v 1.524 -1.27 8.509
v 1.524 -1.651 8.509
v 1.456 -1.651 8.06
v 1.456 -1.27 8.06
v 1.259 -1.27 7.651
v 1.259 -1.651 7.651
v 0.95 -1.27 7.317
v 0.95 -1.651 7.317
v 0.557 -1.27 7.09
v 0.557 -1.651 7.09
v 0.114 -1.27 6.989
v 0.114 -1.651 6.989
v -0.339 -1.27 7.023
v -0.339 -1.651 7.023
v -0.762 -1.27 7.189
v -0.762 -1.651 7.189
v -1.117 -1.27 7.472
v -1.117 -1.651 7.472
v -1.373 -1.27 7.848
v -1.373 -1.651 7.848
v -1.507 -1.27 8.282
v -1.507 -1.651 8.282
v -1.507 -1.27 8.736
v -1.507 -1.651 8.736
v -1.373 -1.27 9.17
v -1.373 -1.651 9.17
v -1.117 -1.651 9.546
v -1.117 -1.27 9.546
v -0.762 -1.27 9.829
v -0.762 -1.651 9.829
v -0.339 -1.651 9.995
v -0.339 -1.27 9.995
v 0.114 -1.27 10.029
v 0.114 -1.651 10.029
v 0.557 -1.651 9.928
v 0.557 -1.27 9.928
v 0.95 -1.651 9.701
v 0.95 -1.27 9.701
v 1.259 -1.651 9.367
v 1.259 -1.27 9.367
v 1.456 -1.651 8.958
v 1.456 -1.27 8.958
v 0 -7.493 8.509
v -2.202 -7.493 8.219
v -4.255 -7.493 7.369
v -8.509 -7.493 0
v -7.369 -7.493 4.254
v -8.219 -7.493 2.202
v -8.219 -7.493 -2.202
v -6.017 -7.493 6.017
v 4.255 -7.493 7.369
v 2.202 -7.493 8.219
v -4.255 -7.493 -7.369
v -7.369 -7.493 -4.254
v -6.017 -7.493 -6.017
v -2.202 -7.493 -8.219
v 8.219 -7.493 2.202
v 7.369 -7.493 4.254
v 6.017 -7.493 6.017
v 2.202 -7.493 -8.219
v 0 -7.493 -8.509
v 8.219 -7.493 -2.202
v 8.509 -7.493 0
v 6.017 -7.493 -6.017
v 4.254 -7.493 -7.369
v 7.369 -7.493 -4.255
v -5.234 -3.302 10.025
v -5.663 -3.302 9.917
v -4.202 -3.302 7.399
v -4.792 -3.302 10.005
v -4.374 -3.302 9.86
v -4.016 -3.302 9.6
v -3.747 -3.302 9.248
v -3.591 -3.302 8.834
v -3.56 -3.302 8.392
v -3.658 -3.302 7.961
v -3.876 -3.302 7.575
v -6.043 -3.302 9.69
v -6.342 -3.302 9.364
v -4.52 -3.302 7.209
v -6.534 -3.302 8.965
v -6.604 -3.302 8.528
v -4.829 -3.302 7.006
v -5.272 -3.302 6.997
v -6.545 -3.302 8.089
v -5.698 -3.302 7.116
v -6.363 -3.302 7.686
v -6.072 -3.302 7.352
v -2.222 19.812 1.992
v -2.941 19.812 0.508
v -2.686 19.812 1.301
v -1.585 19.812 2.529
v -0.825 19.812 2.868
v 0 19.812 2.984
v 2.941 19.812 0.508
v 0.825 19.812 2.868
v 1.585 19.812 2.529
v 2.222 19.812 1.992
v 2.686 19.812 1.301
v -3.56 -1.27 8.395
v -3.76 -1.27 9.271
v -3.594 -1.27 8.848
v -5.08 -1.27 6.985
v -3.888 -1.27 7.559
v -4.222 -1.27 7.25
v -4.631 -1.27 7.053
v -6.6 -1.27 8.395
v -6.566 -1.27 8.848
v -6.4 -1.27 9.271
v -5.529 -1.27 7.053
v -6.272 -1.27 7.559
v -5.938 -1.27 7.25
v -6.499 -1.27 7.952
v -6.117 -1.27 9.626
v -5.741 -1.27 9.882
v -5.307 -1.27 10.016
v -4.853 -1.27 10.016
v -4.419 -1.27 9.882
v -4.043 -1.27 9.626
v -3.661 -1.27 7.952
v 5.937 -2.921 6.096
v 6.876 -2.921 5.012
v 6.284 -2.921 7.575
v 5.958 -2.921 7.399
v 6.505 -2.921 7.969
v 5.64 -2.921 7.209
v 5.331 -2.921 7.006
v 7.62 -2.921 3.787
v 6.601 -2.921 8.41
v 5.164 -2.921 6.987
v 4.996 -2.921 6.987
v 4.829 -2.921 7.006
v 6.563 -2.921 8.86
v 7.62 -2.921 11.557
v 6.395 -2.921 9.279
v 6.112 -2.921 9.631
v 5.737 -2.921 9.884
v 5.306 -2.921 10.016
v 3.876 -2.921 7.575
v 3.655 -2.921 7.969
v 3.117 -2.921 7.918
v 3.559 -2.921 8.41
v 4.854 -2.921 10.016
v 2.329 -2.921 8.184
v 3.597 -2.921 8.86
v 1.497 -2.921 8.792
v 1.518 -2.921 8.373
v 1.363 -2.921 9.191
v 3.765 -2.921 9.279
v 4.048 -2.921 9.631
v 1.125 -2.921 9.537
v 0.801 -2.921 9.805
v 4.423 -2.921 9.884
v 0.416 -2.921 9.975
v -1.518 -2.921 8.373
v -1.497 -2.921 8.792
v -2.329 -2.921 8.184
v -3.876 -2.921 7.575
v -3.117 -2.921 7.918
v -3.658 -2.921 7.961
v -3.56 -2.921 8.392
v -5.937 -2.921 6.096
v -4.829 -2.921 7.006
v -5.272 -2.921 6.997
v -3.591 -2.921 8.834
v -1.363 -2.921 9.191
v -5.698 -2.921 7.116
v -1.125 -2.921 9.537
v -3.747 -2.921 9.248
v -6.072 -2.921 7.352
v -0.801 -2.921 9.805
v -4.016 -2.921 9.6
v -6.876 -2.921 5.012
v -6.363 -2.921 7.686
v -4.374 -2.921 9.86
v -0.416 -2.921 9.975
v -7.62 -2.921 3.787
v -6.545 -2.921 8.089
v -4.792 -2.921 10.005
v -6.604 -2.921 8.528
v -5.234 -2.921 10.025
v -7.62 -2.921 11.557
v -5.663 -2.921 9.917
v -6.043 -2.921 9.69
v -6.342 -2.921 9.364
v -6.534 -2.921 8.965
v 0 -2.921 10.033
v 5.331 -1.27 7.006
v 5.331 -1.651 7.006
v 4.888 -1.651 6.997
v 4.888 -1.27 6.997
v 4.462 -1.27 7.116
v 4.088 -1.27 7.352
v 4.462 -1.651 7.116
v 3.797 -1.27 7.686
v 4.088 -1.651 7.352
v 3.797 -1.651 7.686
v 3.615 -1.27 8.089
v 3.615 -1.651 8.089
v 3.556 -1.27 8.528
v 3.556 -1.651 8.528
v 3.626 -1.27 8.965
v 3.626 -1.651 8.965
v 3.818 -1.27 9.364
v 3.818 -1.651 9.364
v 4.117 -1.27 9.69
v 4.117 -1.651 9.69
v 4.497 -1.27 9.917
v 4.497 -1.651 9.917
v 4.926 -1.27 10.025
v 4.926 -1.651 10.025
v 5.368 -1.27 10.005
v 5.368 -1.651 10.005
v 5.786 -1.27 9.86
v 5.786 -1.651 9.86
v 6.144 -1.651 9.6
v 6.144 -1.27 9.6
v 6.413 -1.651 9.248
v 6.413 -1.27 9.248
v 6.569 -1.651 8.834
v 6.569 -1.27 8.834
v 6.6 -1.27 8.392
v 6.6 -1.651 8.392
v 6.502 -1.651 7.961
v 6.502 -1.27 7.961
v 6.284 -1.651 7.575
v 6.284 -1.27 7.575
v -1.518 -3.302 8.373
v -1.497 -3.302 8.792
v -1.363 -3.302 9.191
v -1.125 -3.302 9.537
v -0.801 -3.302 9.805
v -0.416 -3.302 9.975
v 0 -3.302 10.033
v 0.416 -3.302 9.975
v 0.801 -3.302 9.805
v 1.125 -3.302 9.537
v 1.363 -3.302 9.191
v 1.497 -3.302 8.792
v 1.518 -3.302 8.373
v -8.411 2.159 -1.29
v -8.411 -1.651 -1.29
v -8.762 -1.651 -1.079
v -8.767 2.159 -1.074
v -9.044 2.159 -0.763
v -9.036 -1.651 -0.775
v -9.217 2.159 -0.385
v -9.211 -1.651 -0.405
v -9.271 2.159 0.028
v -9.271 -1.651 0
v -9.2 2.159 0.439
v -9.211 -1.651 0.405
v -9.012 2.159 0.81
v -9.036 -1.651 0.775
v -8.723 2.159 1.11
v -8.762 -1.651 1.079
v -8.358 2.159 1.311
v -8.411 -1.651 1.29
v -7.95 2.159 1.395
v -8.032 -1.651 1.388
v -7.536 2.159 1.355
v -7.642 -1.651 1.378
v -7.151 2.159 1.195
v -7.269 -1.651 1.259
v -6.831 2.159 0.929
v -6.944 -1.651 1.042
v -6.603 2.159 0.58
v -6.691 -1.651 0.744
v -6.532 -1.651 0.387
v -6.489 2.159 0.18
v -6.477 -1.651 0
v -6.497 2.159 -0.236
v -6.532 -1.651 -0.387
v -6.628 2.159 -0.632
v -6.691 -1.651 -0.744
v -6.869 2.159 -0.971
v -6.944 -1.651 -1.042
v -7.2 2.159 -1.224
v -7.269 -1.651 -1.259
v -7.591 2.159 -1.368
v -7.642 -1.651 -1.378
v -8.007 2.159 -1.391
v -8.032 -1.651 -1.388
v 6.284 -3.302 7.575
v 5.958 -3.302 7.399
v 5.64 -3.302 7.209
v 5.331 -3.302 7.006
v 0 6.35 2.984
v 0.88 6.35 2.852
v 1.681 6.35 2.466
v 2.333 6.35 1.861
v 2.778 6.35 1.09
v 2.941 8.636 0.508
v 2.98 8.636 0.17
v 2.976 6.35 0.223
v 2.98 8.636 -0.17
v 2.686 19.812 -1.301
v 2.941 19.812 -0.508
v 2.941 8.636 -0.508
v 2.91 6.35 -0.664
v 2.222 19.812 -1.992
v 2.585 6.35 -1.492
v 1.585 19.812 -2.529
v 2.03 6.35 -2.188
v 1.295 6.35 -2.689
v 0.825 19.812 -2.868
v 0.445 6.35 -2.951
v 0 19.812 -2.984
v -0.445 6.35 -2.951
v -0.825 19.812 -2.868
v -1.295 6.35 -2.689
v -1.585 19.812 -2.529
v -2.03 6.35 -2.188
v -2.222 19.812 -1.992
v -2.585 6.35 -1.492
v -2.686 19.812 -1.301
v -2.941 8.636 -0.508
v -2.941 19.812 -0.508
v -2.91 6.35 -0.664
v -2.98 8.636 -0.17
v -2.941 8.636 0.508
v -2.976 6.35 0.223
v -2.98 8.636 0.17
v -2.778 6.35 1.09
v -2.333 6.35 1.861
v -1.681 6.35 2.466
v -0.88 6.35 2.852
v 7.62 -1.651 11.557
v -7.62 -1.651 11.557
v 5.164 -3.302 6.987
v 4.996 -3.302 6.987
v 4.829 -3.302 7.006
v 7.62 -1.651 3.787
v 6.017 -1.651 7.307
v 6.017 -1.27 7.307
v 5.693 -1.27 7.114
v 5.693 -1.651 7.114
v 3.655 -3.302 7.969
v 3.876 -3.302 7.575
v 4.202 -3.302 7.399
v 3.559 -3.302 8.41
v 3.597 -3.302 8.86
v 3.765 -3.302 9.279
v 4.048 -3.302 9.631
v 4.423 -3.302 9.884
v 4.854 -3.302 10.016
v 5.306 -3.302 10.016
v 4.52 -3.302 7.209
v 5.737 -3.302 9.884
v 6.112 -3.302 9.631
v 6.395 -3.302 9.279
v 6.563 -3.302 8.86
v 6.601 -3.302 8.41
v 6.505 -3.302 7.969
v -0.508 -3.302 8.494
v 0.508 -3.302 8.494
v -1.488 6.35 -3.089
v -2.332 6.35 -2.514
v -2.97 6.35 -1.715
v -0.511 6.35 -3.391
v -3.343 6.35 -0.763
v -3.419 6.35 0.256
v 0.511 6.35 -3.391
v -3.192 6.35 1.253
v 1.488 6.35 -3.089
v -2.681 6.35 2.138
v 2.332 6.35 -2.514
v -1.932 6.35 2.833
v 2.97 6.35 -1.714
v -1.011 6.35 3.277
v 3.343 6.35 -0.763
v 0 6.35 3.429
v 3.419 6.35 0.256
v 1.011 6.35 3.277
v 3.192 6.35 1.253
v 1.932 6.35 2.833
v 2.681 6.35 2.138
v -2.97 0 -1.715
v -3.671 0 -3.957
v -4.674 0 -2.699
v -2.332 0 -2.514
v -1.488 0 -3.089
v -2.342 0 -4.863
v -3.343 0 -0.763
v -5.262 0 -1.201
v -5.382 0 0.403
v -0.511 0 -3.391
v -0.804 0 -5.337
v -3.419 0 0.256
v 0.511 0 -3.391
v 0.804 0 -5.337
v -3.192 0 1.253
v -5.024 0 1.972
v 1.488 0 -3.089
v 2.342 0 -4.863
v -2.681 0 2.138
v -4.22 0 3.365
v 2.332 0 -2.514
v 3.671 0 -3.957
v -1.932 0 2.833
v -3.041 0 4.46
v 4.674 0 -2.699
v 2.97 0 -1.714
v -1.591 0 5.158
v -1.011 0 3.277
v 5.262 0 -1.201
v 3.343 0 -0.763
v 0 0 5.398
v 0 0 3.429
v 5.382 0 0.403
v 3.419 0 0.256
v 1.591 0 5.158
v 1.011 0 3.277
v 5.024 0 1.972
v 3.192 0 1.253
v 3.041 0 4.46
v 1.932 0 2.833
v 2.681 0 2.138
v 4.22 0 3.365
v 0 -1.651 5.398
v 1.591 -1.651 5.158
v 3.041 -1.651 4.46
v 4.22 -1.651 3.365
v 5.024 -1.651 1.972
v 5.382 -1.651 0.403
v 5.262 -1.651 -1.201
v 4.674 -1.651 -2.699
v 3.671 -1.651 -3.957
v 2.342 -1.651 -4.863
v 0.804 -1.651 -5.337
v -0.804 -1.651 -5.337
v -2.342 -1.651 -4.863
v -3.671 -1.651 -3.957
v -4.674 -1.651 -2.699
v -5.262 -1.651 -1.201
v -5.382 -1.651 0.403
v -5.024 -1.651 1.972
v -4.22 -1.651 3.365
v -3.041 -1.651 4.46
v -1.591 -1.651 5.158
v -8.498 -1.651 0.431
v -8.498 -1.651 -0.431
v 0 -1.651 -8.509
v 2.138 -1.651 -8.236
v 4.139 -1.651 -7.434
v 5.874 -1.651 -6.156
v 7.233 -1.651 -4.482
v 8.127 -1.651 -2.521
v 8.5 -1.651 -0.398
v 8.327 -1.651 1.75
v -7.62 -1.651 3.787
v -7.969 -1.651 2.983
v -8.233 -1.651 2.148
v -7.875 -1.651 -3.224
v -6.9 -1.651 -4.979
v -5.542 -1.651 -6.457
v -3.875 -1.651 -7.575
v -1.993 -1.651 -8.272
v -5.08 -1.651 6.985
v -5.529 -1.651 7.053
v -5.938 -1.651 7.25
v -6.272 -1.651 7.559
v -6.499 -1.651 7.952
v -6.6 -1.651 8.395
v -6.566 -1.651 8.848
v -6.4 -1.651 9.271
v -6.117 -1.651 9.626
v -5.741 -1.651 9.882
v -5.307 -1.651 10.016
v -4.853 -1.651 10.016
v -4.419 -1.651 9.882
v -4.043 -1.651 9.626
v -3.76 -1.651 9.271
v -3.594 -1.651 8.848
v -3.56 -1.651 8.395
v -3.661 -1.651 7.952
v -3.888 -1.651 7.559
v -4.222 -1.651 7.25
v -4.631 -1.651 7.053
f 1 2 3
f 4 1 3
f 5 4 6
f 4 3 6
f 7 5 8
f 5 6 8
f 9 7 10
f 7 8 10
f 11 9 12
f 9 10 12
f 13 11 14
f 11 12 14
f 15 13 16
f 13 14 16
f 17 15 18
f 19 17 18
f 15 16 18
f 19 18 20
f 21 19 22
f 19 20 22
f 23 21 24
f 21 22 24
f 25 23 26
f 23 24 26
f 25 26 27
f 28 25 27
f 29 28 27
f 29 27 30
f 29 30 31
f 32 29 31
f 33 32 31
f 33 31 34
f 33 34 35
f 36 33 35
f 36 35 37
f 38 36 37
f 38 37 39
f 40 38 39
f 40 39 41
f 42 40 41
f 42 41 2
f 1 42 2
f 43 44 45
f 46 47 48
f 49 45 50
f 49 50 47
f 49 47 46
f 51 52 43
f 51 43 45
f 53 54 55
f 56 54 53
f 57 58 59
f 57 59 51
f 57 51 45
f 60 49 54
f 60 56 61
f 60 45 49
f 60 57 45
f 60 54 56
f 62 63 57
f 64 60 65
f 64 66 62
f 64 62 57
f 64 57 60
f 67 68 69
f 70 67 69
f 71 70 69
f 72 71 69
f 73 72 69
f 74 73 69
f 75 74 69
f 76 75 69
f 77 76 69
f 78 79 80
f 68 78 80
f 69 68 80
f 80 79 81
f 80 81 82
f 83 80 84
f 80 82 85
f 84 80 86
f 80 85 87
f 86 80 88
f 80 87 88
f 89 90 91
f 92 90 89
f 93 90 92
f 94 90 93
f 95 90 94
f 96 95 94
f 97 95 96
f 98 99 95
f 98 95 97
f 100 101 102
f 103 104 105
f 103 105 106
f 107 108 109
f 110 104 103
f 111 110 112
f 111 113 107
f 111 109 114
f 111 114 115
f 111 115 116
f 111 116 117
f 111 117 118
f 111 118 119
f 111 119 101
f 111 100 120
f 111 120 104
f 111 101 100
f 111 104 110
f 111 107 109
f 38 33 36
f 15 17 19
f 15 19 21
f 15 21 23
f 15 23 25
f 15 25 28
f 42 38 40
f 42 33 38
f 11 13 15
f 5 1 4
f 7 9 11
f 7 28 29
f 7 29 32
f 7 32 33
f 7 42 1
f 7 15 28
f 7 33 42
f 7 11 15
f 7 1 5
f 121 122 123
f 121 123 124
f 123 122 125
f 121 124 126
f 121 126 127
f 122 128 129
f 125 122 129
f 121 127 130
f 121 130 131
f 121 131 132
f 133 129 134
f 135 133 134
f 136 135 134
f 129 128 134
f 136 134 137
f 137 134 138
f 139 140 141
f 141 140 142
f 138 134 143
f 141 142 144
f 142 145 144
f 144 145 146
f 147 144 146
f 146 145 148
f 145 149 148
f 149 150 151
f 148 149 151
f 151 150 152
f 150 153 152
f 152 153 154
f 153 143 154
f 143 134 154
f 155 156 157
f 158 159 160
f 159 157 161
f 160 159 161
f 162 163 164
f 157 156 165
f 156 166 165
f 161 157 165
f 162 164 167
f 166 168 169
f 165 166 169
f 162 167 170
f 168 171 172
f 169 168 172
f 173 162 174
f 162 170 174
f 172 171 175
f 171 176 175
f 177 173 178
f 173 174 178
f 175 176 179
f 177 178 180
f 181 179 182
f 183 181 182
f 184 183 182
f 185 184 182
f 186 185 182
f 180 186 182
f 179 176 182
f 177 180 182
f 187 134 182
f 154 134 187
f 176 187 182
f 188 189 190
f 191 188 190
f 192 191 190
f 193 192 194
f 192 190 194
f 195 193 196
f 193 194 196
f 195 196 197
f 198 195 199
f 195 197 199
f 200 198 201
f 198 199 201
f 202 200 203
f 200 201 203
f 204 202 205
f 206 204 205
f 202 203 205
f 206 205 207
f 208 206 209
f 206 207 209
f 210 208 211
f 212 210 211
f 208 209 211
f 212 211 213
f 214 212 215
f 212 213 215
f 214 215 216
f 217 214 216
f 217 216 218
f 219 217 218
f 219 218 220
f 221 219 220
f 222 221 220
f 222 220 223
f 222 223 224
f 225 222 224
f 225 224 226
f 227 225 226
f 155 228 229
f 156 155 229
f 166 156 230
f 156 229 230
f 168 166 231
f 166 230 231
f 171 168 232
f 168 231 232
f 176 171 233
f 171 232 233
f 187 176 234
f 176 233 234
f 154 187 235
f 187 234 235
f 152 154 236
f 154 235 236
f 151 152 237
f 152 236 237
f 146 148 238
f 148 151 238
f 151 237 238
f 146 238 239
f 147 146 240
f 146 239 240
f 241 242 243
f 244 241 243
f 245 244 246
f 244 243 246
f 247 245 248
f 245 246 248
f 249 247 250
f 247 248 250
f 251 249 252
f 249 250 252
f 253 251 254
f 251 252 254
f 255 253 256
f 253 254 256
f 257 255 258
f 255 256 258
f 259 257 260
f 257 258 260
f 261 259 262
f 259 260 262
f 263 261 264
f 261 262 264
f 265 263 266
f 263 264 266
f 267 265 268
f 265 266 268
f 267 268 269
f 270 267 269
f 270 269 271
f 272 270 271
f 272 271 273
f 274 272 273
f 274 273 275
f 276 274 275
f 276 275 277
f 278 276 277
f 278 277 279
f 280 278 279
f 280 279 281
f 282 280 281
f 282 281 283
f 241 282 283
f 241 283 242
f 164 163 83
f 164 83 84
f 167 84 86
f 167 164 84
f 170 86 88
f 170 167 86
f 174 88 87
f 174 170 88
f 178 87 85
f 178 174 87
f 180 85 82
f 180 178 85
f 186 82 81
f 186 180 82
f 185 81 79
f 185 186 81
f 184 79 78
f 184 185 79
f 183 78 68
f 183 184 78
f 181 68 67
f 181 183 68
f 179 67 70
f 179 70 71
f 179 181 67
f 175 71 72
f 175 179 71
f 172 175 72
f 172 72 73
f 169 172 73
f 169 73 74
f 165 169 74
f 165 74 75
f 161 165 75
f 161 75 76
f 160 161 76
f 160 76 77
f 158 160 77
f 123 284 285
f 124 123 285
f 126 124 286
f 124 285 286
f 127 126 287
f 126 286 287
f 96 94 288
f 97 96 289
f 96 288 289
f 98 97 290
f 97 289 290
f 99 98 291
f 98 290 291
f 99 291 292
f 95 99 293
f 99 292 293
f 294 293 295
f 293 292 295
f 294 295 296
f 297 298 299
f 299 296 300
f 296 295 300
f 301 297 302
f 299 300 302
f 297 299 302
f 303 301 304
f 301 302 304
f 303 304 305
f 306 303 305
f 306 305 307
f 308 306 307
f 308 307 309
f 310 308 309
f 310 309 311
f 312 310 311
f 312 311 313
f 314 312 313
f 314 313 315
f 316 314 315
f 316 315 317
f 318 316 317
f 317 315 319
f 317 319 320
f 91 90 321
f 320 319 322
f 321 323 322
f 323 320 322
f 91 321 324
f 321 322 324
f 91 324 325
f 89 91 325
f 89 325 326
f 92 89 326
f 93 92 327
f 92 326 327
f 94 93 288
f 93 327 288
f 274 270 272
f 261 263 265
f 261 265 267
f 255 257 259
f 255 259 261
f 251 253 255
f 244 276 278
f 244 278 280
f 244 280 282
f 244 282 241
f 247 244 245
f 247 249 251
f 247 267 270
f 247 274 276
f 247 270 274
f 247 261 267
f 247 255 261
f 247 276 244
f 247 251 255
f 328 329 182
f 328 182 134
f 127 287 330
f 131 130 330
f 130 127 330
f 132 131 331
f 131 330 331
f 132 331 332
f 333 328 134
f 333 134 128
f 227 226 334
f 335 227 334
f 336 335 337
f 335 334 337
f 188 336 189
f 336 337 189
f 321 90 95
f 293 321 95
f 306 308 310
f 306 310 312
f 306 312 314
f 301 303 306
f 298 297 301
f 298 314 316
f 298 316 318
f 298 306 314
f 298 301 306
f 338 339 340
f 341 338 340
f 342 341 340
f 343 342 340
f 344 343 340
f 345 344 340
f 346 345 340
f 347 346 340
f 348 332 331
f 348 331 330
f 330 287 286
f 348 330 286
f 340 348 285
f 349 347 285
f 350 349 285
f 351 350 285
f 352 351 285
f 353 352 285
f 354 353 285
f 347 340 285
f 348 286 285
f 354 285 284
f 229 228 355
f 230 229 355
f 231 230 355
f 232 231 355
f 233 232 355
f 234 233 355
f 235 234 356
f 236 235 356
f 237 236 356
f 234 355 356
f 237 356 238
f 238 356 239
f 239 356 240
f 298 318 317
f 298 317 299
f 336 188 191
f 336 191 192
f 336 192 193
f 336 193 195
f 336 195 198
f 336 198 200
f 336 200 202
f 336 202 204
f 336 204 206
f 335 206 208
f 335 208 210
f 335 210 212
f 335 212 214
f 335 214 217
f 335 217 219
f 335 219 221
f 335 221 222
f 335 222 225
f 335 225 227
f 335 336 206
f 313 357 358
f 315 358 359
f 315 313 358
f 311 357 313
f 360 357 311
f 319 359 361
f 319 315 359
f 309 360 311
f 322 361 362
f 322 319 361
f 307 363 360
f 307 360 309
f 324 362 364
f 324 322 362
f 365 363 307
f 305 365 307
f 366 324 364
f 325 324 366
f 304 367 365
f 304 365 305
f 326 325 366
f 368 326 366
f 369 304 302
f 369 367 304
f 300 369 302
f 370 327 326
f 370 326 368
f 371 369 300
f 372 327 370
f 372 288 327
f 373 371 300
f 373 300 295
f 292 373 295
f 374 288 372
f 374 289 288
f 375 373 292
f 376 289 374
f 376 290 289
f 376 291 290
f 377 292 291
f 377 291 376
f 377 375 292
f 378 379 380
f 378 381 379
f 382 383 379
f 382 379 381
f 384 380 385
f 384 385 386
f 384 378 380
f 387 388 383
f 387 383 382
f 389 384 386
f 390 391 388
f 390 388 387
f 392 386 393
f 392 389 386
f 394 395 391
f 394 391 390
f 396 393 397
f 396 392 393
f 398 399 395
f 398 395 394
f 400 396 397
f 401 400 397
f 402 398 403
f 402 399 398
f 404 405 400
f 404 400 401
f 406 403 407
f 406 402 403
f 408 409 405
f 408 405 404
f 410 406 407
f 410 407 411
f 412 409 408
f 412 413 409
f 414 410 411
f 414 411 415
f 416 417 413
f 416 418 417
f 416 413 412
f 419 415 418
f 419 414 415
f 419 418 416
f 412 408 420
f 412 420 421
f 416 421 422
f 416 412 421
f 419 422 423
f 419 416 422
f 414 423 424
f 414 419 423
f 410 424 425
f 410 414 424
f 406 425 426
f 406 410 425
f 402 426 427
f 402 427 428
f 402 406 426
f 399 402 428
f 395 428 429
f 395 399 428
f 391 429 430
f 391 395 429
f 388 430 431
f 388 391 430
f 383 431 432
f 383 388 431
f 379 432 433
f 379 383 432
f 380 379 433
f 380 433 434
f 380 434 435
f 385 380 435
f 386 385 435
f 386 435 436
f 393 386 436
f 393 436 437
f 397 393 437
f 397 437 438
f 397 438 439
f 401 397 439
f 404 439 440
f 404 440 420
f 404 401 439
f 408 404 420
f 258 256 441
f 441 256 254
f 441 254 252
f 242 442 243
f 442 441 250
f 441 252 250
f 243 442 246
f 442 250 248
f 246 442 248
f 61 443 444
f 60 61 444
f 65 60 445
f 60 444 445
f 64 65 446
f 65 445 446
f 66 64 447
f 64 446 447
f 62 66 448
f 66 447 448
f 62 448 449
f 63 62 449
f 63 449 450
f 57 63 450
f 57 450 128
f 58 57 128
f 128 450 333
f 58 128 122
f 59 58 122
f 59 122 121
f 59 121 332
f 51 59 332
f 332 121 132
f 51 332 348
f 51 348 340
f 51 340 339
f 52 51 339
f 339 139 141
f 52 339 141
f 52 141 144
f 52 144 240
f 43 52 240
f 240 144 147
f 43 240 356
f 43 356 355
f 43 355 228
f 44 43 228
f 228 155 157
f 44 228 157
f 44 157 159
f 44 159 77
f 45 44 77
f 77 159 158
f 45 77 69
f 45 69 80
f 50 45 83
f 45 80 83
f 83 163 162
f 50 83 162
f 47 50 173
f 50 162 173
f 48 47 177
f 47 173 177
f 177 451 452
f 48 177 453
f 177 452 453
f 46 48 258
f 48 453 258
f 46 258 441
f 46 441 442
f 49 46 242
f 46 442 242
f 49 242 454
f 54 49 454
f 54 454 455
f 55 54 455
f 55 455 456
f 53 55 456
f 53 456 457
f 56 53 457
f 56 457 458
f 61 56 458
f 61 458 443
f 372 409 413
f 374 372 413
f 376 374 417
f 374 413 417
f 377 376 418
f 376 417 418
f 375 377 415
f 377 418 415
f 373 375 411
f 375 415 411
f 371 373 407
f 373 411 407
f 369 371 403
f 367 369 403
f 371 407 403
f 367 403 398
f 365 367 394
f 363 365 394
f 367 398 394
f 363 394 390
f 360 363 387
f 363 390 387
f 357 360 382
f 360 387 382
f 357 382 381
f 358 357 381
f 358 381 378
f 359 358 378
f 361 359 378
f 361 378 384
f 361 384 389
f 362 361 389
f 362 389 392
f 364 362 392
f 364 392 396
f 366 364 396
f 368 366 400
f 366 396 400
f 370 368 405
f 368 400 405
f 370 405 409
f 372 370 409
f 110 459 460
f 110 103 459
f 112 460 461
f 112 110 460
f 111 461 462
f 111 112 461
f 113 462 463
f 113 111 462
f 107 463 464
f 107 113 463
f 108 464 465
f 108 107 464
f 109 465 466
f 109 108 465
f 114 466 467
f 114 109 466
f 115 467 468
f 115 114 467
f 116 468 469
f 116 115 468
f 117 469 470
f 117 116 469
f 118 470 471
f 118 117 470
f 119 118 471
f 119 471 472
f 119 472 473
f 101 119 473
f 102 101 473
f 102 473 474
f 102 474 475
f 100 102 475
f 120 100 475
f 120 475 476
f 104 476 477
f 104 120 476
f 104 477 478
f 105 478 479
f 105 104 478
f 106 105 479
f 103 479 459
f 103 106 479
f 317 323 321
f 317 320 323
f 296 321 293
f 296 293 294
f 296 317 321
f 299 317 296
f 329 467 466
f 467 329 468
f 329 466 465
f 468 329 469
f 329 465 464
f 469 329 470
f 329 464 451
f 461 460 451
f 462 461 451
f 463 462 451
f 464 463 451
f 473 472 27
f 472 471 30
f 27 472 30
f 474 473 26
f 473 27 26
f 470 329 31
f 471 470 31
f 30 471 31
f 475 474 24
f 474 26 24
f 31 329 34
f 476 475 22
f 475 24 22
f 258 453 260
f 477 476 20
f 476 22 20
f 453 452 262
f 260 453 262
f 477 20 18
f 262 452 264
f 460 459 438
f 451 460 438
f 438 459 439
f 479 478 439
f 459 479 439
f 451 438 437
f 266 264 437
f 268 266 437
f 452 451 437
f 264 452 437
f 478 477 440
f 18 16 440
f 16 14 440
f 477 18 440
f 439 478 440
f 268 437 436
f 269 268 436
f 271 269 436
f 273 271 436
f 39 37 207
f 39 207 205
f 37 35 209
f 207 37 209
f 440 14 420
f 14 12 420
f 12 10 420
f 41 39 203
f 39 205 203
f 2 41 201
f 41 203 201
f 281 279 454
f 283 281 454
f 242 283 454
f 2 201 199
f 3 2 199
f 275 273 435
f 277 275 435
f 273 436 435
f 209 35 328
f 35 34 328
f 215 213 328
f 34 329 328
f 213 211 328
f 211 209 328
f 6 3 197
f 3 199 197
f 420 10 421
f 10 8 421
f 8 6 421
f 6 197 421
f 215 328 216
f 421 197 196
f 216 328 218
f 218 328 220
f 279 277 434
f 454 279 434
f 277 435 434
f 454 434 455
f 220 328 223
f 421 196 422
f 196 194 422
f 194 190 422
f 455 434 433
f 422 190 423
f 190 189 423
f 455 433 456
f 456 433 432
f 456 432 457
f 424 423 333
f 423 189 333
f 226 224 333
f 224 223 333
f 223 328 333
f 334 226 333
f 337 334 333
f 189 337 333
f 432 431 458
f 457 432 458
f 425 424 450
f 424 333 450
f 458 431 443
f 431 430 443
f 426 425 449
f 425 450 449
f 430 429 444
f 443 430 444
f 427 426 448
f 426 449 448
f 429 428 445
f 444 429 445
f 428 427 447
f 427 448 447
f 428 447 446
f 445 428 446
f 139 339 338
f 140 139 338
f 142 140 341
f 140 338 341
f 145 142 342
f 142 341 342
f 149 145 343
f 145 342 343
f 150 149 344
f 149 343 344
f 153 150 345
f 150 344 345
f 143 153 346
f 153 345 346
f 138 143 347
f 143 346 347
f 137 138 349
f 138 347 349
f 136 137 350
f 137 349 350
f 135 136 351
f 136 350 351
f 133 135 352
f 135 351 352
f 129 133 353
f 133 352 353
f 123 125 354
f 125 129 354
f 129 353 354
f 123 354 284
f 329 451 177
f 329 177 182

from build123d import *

# Parameters (mm, degrees)
SKETCH1_R            = 5.3975
BOSS_EXTRUDE1_DEPTH  = 1.651
SKETCH2_R            = 8.509
BOSS_EXTRUDE2_DEPTH  = 5.842
SKETCH3_R            = 3.429
BOSS_EXTRUDE3_DEPTH  = 6.35
SKETCH6_R            = 2.9845
BOSS_EXTRUDE5_DEPTH  = 13.462
SKETCH12_W           = 6.35
SKETCH12_H           = 1.016
CUT_EXTRUDE1_DEPTH   = 11.176
BOSS_EXTRUDE7_DEPTH  = 1.27
SKETCH14_R           = 1.524
BOSS_EXTRUDE11_DEPTH = 1.016
LPATTERN2_START      = -3.302
LPATTERN2_OUTLINE_R  = 1.524
LPATTERN2_DEPTH      = 2.032
LPATTERN2_START_2    = -1.651
LPATTERN2_2_DEPTH    = 0.381
SKETCH4_R            = 1.397
BOSS_EXTRUDE8_DEPTH  = 3.81


# Read off the part's stored shape, not the designer's step: LPattern2
with BuildPart() as part:
    # Sketch1 → Boss-Extrude1 (new body)
    with BuildSketch(Plane(origin=(0, 0, 0), x_dir=(1, 0, 0), z_dir=(0, 1, 0))):
        with Locations(Location((0, 0, 0), (0, 0, 270))):
            Circle(SKETCH1_R)
    extrude(amount=-BOSS_EXTRUDE1_DEPTH)

    # Sketch2 → Boss-Extrude2 (add)
    with BuildSketch(Plane.XZ.offset(1.651)):
        with Locations(Location((0, 0, 0), (0, 0, 270))):
            Circle(SKETCH2_R)
    extrude(amount=BOSS_EXTRUDE2_DEPTH)

    # Sketch3 → Boss-Extrude3 (add)
    with BuildSketch(Plane(origin=(0, 0, 0), x_dir=(1, 0, 0), z_dir=(0, 1, 0))):
        with Locations(Location((0, 0, 0), (0, 0, 270))):
            Circle(SKETCH3_R)
    extrude(amount=BOSS_EXTRUDE3_DEPTH)

    # Sketch6 → Boss-Extrude5 (add)
    with BuildSketch(Plane(origin=(0, 6.35, 0), x_dir=(1, 0, 0), z_dir=(0, 1, 0))):
        with Locations(Location((0, 0, 0), (0, 0, 270))):
            Circle(SKETCH6_R)
    extrude(amount=BOSS_EXTRUDE5_DEPTH)

    # Sketch12 → Cut-Extrude1 (cut)
    with BuildSketch(Plane(origin=(0, 19.812, 0), x_dir=(1, 0, 0), z_dir=(0, 1, 0))):
        Rectangle(SKETCH12_W, SKETCH12_H)
    extrude(amount=-CUT_EXTRUDE1_DEPTH, mode=Mode.SUBTRACT)

    # Sketch11 → Boss-Extrude7 (add)
    with BuildSketch(Plane.XZ.offset(1.651)):
        with BuildLine():
            Line((-7.62, 3.175), (-7.62, 11.557))
            Line((-7.62, 11.557), (7.62, 11.557))
            Line((7.62, 11.557), (7.62, 3.175))
            ThreePointArc((7.62, 3.175), (0, -8.255), (-7.62, 3.175))
        make_face()
    extrude(amount=BOSS_EXTRUDE7_DEPTH)

    # Sketch14 → Boss-Extrude11 (add, symmetric)
    with BuildSketch(Plane(origin=(0, -2.286, 0), x_dir=(1, 0, 0), z_dir=(0, 1, 0))):
        with Locations(Location((-5.08, -8.509, 0), (0, 0, 90))):
            Circle(SKETCH14_R)
    extrude(amount=BOSS_EXTRUDE11_DEPTH, both=True)

    # LPattern2 outline → LPattern2 (add)
    with BuildSketch(Plane(origin=(0, 0, 0), x_dir=(1, 0, 0), z_dir=(0, 1, 0)).offset(LPATTERN2_START)):
        with Locations((0, -8.509)):
            Circle(LPATTERN2_OUTLINE_R)
        with BuildLine():
            ThreePointArc((5.330666391, -7.005756054), (4.298782485, -9.817539336), (6.284337715, -7.575112069))
            ThreePointArc((6.284337715, -7.575112069), (5.798202212, -7.306011296), (5.330666391, -7.005756054))
        make_face()
    extrude(amount=LPATTERN2_DEPTH)

    # LPattern2 2 outline → LPattern2 2 (add)
    with BuildSketch(Plane(origin=(0, 0, 0), x_dir=(1, 0, 0), z_dir=(0, 1, 0)).offset(LPATTERN2_START_2)):
        with BuildLine():
            ThreePointArc((5.330666391, -7.005756054), (5.798202212, -7.306011296), (6.284337715, -7.575112069))
            ThreePointArc((6.284337715, -7.575112069), (5.861217515, -7.200460664), (5.330666391, -7.005756054))
        make_face()
    extrude(amount=LPATTERN2_2_DEPTH)

    # Sketch4 → Boss-Extrude8 (add)
    with BuildSketch(Plane(origin=(0, -1.651, 0), x_dir=(1, 0, 0), z_dir=(0, 1, 0))):
        with Locations(Location((-7.874, 0, 0), (0, 0, 112.591863996))):
            Circle(SKETCH4_R)
    extrude(amount=BOSS_EXTRUDE8_DEPTH)


solid = part.part
